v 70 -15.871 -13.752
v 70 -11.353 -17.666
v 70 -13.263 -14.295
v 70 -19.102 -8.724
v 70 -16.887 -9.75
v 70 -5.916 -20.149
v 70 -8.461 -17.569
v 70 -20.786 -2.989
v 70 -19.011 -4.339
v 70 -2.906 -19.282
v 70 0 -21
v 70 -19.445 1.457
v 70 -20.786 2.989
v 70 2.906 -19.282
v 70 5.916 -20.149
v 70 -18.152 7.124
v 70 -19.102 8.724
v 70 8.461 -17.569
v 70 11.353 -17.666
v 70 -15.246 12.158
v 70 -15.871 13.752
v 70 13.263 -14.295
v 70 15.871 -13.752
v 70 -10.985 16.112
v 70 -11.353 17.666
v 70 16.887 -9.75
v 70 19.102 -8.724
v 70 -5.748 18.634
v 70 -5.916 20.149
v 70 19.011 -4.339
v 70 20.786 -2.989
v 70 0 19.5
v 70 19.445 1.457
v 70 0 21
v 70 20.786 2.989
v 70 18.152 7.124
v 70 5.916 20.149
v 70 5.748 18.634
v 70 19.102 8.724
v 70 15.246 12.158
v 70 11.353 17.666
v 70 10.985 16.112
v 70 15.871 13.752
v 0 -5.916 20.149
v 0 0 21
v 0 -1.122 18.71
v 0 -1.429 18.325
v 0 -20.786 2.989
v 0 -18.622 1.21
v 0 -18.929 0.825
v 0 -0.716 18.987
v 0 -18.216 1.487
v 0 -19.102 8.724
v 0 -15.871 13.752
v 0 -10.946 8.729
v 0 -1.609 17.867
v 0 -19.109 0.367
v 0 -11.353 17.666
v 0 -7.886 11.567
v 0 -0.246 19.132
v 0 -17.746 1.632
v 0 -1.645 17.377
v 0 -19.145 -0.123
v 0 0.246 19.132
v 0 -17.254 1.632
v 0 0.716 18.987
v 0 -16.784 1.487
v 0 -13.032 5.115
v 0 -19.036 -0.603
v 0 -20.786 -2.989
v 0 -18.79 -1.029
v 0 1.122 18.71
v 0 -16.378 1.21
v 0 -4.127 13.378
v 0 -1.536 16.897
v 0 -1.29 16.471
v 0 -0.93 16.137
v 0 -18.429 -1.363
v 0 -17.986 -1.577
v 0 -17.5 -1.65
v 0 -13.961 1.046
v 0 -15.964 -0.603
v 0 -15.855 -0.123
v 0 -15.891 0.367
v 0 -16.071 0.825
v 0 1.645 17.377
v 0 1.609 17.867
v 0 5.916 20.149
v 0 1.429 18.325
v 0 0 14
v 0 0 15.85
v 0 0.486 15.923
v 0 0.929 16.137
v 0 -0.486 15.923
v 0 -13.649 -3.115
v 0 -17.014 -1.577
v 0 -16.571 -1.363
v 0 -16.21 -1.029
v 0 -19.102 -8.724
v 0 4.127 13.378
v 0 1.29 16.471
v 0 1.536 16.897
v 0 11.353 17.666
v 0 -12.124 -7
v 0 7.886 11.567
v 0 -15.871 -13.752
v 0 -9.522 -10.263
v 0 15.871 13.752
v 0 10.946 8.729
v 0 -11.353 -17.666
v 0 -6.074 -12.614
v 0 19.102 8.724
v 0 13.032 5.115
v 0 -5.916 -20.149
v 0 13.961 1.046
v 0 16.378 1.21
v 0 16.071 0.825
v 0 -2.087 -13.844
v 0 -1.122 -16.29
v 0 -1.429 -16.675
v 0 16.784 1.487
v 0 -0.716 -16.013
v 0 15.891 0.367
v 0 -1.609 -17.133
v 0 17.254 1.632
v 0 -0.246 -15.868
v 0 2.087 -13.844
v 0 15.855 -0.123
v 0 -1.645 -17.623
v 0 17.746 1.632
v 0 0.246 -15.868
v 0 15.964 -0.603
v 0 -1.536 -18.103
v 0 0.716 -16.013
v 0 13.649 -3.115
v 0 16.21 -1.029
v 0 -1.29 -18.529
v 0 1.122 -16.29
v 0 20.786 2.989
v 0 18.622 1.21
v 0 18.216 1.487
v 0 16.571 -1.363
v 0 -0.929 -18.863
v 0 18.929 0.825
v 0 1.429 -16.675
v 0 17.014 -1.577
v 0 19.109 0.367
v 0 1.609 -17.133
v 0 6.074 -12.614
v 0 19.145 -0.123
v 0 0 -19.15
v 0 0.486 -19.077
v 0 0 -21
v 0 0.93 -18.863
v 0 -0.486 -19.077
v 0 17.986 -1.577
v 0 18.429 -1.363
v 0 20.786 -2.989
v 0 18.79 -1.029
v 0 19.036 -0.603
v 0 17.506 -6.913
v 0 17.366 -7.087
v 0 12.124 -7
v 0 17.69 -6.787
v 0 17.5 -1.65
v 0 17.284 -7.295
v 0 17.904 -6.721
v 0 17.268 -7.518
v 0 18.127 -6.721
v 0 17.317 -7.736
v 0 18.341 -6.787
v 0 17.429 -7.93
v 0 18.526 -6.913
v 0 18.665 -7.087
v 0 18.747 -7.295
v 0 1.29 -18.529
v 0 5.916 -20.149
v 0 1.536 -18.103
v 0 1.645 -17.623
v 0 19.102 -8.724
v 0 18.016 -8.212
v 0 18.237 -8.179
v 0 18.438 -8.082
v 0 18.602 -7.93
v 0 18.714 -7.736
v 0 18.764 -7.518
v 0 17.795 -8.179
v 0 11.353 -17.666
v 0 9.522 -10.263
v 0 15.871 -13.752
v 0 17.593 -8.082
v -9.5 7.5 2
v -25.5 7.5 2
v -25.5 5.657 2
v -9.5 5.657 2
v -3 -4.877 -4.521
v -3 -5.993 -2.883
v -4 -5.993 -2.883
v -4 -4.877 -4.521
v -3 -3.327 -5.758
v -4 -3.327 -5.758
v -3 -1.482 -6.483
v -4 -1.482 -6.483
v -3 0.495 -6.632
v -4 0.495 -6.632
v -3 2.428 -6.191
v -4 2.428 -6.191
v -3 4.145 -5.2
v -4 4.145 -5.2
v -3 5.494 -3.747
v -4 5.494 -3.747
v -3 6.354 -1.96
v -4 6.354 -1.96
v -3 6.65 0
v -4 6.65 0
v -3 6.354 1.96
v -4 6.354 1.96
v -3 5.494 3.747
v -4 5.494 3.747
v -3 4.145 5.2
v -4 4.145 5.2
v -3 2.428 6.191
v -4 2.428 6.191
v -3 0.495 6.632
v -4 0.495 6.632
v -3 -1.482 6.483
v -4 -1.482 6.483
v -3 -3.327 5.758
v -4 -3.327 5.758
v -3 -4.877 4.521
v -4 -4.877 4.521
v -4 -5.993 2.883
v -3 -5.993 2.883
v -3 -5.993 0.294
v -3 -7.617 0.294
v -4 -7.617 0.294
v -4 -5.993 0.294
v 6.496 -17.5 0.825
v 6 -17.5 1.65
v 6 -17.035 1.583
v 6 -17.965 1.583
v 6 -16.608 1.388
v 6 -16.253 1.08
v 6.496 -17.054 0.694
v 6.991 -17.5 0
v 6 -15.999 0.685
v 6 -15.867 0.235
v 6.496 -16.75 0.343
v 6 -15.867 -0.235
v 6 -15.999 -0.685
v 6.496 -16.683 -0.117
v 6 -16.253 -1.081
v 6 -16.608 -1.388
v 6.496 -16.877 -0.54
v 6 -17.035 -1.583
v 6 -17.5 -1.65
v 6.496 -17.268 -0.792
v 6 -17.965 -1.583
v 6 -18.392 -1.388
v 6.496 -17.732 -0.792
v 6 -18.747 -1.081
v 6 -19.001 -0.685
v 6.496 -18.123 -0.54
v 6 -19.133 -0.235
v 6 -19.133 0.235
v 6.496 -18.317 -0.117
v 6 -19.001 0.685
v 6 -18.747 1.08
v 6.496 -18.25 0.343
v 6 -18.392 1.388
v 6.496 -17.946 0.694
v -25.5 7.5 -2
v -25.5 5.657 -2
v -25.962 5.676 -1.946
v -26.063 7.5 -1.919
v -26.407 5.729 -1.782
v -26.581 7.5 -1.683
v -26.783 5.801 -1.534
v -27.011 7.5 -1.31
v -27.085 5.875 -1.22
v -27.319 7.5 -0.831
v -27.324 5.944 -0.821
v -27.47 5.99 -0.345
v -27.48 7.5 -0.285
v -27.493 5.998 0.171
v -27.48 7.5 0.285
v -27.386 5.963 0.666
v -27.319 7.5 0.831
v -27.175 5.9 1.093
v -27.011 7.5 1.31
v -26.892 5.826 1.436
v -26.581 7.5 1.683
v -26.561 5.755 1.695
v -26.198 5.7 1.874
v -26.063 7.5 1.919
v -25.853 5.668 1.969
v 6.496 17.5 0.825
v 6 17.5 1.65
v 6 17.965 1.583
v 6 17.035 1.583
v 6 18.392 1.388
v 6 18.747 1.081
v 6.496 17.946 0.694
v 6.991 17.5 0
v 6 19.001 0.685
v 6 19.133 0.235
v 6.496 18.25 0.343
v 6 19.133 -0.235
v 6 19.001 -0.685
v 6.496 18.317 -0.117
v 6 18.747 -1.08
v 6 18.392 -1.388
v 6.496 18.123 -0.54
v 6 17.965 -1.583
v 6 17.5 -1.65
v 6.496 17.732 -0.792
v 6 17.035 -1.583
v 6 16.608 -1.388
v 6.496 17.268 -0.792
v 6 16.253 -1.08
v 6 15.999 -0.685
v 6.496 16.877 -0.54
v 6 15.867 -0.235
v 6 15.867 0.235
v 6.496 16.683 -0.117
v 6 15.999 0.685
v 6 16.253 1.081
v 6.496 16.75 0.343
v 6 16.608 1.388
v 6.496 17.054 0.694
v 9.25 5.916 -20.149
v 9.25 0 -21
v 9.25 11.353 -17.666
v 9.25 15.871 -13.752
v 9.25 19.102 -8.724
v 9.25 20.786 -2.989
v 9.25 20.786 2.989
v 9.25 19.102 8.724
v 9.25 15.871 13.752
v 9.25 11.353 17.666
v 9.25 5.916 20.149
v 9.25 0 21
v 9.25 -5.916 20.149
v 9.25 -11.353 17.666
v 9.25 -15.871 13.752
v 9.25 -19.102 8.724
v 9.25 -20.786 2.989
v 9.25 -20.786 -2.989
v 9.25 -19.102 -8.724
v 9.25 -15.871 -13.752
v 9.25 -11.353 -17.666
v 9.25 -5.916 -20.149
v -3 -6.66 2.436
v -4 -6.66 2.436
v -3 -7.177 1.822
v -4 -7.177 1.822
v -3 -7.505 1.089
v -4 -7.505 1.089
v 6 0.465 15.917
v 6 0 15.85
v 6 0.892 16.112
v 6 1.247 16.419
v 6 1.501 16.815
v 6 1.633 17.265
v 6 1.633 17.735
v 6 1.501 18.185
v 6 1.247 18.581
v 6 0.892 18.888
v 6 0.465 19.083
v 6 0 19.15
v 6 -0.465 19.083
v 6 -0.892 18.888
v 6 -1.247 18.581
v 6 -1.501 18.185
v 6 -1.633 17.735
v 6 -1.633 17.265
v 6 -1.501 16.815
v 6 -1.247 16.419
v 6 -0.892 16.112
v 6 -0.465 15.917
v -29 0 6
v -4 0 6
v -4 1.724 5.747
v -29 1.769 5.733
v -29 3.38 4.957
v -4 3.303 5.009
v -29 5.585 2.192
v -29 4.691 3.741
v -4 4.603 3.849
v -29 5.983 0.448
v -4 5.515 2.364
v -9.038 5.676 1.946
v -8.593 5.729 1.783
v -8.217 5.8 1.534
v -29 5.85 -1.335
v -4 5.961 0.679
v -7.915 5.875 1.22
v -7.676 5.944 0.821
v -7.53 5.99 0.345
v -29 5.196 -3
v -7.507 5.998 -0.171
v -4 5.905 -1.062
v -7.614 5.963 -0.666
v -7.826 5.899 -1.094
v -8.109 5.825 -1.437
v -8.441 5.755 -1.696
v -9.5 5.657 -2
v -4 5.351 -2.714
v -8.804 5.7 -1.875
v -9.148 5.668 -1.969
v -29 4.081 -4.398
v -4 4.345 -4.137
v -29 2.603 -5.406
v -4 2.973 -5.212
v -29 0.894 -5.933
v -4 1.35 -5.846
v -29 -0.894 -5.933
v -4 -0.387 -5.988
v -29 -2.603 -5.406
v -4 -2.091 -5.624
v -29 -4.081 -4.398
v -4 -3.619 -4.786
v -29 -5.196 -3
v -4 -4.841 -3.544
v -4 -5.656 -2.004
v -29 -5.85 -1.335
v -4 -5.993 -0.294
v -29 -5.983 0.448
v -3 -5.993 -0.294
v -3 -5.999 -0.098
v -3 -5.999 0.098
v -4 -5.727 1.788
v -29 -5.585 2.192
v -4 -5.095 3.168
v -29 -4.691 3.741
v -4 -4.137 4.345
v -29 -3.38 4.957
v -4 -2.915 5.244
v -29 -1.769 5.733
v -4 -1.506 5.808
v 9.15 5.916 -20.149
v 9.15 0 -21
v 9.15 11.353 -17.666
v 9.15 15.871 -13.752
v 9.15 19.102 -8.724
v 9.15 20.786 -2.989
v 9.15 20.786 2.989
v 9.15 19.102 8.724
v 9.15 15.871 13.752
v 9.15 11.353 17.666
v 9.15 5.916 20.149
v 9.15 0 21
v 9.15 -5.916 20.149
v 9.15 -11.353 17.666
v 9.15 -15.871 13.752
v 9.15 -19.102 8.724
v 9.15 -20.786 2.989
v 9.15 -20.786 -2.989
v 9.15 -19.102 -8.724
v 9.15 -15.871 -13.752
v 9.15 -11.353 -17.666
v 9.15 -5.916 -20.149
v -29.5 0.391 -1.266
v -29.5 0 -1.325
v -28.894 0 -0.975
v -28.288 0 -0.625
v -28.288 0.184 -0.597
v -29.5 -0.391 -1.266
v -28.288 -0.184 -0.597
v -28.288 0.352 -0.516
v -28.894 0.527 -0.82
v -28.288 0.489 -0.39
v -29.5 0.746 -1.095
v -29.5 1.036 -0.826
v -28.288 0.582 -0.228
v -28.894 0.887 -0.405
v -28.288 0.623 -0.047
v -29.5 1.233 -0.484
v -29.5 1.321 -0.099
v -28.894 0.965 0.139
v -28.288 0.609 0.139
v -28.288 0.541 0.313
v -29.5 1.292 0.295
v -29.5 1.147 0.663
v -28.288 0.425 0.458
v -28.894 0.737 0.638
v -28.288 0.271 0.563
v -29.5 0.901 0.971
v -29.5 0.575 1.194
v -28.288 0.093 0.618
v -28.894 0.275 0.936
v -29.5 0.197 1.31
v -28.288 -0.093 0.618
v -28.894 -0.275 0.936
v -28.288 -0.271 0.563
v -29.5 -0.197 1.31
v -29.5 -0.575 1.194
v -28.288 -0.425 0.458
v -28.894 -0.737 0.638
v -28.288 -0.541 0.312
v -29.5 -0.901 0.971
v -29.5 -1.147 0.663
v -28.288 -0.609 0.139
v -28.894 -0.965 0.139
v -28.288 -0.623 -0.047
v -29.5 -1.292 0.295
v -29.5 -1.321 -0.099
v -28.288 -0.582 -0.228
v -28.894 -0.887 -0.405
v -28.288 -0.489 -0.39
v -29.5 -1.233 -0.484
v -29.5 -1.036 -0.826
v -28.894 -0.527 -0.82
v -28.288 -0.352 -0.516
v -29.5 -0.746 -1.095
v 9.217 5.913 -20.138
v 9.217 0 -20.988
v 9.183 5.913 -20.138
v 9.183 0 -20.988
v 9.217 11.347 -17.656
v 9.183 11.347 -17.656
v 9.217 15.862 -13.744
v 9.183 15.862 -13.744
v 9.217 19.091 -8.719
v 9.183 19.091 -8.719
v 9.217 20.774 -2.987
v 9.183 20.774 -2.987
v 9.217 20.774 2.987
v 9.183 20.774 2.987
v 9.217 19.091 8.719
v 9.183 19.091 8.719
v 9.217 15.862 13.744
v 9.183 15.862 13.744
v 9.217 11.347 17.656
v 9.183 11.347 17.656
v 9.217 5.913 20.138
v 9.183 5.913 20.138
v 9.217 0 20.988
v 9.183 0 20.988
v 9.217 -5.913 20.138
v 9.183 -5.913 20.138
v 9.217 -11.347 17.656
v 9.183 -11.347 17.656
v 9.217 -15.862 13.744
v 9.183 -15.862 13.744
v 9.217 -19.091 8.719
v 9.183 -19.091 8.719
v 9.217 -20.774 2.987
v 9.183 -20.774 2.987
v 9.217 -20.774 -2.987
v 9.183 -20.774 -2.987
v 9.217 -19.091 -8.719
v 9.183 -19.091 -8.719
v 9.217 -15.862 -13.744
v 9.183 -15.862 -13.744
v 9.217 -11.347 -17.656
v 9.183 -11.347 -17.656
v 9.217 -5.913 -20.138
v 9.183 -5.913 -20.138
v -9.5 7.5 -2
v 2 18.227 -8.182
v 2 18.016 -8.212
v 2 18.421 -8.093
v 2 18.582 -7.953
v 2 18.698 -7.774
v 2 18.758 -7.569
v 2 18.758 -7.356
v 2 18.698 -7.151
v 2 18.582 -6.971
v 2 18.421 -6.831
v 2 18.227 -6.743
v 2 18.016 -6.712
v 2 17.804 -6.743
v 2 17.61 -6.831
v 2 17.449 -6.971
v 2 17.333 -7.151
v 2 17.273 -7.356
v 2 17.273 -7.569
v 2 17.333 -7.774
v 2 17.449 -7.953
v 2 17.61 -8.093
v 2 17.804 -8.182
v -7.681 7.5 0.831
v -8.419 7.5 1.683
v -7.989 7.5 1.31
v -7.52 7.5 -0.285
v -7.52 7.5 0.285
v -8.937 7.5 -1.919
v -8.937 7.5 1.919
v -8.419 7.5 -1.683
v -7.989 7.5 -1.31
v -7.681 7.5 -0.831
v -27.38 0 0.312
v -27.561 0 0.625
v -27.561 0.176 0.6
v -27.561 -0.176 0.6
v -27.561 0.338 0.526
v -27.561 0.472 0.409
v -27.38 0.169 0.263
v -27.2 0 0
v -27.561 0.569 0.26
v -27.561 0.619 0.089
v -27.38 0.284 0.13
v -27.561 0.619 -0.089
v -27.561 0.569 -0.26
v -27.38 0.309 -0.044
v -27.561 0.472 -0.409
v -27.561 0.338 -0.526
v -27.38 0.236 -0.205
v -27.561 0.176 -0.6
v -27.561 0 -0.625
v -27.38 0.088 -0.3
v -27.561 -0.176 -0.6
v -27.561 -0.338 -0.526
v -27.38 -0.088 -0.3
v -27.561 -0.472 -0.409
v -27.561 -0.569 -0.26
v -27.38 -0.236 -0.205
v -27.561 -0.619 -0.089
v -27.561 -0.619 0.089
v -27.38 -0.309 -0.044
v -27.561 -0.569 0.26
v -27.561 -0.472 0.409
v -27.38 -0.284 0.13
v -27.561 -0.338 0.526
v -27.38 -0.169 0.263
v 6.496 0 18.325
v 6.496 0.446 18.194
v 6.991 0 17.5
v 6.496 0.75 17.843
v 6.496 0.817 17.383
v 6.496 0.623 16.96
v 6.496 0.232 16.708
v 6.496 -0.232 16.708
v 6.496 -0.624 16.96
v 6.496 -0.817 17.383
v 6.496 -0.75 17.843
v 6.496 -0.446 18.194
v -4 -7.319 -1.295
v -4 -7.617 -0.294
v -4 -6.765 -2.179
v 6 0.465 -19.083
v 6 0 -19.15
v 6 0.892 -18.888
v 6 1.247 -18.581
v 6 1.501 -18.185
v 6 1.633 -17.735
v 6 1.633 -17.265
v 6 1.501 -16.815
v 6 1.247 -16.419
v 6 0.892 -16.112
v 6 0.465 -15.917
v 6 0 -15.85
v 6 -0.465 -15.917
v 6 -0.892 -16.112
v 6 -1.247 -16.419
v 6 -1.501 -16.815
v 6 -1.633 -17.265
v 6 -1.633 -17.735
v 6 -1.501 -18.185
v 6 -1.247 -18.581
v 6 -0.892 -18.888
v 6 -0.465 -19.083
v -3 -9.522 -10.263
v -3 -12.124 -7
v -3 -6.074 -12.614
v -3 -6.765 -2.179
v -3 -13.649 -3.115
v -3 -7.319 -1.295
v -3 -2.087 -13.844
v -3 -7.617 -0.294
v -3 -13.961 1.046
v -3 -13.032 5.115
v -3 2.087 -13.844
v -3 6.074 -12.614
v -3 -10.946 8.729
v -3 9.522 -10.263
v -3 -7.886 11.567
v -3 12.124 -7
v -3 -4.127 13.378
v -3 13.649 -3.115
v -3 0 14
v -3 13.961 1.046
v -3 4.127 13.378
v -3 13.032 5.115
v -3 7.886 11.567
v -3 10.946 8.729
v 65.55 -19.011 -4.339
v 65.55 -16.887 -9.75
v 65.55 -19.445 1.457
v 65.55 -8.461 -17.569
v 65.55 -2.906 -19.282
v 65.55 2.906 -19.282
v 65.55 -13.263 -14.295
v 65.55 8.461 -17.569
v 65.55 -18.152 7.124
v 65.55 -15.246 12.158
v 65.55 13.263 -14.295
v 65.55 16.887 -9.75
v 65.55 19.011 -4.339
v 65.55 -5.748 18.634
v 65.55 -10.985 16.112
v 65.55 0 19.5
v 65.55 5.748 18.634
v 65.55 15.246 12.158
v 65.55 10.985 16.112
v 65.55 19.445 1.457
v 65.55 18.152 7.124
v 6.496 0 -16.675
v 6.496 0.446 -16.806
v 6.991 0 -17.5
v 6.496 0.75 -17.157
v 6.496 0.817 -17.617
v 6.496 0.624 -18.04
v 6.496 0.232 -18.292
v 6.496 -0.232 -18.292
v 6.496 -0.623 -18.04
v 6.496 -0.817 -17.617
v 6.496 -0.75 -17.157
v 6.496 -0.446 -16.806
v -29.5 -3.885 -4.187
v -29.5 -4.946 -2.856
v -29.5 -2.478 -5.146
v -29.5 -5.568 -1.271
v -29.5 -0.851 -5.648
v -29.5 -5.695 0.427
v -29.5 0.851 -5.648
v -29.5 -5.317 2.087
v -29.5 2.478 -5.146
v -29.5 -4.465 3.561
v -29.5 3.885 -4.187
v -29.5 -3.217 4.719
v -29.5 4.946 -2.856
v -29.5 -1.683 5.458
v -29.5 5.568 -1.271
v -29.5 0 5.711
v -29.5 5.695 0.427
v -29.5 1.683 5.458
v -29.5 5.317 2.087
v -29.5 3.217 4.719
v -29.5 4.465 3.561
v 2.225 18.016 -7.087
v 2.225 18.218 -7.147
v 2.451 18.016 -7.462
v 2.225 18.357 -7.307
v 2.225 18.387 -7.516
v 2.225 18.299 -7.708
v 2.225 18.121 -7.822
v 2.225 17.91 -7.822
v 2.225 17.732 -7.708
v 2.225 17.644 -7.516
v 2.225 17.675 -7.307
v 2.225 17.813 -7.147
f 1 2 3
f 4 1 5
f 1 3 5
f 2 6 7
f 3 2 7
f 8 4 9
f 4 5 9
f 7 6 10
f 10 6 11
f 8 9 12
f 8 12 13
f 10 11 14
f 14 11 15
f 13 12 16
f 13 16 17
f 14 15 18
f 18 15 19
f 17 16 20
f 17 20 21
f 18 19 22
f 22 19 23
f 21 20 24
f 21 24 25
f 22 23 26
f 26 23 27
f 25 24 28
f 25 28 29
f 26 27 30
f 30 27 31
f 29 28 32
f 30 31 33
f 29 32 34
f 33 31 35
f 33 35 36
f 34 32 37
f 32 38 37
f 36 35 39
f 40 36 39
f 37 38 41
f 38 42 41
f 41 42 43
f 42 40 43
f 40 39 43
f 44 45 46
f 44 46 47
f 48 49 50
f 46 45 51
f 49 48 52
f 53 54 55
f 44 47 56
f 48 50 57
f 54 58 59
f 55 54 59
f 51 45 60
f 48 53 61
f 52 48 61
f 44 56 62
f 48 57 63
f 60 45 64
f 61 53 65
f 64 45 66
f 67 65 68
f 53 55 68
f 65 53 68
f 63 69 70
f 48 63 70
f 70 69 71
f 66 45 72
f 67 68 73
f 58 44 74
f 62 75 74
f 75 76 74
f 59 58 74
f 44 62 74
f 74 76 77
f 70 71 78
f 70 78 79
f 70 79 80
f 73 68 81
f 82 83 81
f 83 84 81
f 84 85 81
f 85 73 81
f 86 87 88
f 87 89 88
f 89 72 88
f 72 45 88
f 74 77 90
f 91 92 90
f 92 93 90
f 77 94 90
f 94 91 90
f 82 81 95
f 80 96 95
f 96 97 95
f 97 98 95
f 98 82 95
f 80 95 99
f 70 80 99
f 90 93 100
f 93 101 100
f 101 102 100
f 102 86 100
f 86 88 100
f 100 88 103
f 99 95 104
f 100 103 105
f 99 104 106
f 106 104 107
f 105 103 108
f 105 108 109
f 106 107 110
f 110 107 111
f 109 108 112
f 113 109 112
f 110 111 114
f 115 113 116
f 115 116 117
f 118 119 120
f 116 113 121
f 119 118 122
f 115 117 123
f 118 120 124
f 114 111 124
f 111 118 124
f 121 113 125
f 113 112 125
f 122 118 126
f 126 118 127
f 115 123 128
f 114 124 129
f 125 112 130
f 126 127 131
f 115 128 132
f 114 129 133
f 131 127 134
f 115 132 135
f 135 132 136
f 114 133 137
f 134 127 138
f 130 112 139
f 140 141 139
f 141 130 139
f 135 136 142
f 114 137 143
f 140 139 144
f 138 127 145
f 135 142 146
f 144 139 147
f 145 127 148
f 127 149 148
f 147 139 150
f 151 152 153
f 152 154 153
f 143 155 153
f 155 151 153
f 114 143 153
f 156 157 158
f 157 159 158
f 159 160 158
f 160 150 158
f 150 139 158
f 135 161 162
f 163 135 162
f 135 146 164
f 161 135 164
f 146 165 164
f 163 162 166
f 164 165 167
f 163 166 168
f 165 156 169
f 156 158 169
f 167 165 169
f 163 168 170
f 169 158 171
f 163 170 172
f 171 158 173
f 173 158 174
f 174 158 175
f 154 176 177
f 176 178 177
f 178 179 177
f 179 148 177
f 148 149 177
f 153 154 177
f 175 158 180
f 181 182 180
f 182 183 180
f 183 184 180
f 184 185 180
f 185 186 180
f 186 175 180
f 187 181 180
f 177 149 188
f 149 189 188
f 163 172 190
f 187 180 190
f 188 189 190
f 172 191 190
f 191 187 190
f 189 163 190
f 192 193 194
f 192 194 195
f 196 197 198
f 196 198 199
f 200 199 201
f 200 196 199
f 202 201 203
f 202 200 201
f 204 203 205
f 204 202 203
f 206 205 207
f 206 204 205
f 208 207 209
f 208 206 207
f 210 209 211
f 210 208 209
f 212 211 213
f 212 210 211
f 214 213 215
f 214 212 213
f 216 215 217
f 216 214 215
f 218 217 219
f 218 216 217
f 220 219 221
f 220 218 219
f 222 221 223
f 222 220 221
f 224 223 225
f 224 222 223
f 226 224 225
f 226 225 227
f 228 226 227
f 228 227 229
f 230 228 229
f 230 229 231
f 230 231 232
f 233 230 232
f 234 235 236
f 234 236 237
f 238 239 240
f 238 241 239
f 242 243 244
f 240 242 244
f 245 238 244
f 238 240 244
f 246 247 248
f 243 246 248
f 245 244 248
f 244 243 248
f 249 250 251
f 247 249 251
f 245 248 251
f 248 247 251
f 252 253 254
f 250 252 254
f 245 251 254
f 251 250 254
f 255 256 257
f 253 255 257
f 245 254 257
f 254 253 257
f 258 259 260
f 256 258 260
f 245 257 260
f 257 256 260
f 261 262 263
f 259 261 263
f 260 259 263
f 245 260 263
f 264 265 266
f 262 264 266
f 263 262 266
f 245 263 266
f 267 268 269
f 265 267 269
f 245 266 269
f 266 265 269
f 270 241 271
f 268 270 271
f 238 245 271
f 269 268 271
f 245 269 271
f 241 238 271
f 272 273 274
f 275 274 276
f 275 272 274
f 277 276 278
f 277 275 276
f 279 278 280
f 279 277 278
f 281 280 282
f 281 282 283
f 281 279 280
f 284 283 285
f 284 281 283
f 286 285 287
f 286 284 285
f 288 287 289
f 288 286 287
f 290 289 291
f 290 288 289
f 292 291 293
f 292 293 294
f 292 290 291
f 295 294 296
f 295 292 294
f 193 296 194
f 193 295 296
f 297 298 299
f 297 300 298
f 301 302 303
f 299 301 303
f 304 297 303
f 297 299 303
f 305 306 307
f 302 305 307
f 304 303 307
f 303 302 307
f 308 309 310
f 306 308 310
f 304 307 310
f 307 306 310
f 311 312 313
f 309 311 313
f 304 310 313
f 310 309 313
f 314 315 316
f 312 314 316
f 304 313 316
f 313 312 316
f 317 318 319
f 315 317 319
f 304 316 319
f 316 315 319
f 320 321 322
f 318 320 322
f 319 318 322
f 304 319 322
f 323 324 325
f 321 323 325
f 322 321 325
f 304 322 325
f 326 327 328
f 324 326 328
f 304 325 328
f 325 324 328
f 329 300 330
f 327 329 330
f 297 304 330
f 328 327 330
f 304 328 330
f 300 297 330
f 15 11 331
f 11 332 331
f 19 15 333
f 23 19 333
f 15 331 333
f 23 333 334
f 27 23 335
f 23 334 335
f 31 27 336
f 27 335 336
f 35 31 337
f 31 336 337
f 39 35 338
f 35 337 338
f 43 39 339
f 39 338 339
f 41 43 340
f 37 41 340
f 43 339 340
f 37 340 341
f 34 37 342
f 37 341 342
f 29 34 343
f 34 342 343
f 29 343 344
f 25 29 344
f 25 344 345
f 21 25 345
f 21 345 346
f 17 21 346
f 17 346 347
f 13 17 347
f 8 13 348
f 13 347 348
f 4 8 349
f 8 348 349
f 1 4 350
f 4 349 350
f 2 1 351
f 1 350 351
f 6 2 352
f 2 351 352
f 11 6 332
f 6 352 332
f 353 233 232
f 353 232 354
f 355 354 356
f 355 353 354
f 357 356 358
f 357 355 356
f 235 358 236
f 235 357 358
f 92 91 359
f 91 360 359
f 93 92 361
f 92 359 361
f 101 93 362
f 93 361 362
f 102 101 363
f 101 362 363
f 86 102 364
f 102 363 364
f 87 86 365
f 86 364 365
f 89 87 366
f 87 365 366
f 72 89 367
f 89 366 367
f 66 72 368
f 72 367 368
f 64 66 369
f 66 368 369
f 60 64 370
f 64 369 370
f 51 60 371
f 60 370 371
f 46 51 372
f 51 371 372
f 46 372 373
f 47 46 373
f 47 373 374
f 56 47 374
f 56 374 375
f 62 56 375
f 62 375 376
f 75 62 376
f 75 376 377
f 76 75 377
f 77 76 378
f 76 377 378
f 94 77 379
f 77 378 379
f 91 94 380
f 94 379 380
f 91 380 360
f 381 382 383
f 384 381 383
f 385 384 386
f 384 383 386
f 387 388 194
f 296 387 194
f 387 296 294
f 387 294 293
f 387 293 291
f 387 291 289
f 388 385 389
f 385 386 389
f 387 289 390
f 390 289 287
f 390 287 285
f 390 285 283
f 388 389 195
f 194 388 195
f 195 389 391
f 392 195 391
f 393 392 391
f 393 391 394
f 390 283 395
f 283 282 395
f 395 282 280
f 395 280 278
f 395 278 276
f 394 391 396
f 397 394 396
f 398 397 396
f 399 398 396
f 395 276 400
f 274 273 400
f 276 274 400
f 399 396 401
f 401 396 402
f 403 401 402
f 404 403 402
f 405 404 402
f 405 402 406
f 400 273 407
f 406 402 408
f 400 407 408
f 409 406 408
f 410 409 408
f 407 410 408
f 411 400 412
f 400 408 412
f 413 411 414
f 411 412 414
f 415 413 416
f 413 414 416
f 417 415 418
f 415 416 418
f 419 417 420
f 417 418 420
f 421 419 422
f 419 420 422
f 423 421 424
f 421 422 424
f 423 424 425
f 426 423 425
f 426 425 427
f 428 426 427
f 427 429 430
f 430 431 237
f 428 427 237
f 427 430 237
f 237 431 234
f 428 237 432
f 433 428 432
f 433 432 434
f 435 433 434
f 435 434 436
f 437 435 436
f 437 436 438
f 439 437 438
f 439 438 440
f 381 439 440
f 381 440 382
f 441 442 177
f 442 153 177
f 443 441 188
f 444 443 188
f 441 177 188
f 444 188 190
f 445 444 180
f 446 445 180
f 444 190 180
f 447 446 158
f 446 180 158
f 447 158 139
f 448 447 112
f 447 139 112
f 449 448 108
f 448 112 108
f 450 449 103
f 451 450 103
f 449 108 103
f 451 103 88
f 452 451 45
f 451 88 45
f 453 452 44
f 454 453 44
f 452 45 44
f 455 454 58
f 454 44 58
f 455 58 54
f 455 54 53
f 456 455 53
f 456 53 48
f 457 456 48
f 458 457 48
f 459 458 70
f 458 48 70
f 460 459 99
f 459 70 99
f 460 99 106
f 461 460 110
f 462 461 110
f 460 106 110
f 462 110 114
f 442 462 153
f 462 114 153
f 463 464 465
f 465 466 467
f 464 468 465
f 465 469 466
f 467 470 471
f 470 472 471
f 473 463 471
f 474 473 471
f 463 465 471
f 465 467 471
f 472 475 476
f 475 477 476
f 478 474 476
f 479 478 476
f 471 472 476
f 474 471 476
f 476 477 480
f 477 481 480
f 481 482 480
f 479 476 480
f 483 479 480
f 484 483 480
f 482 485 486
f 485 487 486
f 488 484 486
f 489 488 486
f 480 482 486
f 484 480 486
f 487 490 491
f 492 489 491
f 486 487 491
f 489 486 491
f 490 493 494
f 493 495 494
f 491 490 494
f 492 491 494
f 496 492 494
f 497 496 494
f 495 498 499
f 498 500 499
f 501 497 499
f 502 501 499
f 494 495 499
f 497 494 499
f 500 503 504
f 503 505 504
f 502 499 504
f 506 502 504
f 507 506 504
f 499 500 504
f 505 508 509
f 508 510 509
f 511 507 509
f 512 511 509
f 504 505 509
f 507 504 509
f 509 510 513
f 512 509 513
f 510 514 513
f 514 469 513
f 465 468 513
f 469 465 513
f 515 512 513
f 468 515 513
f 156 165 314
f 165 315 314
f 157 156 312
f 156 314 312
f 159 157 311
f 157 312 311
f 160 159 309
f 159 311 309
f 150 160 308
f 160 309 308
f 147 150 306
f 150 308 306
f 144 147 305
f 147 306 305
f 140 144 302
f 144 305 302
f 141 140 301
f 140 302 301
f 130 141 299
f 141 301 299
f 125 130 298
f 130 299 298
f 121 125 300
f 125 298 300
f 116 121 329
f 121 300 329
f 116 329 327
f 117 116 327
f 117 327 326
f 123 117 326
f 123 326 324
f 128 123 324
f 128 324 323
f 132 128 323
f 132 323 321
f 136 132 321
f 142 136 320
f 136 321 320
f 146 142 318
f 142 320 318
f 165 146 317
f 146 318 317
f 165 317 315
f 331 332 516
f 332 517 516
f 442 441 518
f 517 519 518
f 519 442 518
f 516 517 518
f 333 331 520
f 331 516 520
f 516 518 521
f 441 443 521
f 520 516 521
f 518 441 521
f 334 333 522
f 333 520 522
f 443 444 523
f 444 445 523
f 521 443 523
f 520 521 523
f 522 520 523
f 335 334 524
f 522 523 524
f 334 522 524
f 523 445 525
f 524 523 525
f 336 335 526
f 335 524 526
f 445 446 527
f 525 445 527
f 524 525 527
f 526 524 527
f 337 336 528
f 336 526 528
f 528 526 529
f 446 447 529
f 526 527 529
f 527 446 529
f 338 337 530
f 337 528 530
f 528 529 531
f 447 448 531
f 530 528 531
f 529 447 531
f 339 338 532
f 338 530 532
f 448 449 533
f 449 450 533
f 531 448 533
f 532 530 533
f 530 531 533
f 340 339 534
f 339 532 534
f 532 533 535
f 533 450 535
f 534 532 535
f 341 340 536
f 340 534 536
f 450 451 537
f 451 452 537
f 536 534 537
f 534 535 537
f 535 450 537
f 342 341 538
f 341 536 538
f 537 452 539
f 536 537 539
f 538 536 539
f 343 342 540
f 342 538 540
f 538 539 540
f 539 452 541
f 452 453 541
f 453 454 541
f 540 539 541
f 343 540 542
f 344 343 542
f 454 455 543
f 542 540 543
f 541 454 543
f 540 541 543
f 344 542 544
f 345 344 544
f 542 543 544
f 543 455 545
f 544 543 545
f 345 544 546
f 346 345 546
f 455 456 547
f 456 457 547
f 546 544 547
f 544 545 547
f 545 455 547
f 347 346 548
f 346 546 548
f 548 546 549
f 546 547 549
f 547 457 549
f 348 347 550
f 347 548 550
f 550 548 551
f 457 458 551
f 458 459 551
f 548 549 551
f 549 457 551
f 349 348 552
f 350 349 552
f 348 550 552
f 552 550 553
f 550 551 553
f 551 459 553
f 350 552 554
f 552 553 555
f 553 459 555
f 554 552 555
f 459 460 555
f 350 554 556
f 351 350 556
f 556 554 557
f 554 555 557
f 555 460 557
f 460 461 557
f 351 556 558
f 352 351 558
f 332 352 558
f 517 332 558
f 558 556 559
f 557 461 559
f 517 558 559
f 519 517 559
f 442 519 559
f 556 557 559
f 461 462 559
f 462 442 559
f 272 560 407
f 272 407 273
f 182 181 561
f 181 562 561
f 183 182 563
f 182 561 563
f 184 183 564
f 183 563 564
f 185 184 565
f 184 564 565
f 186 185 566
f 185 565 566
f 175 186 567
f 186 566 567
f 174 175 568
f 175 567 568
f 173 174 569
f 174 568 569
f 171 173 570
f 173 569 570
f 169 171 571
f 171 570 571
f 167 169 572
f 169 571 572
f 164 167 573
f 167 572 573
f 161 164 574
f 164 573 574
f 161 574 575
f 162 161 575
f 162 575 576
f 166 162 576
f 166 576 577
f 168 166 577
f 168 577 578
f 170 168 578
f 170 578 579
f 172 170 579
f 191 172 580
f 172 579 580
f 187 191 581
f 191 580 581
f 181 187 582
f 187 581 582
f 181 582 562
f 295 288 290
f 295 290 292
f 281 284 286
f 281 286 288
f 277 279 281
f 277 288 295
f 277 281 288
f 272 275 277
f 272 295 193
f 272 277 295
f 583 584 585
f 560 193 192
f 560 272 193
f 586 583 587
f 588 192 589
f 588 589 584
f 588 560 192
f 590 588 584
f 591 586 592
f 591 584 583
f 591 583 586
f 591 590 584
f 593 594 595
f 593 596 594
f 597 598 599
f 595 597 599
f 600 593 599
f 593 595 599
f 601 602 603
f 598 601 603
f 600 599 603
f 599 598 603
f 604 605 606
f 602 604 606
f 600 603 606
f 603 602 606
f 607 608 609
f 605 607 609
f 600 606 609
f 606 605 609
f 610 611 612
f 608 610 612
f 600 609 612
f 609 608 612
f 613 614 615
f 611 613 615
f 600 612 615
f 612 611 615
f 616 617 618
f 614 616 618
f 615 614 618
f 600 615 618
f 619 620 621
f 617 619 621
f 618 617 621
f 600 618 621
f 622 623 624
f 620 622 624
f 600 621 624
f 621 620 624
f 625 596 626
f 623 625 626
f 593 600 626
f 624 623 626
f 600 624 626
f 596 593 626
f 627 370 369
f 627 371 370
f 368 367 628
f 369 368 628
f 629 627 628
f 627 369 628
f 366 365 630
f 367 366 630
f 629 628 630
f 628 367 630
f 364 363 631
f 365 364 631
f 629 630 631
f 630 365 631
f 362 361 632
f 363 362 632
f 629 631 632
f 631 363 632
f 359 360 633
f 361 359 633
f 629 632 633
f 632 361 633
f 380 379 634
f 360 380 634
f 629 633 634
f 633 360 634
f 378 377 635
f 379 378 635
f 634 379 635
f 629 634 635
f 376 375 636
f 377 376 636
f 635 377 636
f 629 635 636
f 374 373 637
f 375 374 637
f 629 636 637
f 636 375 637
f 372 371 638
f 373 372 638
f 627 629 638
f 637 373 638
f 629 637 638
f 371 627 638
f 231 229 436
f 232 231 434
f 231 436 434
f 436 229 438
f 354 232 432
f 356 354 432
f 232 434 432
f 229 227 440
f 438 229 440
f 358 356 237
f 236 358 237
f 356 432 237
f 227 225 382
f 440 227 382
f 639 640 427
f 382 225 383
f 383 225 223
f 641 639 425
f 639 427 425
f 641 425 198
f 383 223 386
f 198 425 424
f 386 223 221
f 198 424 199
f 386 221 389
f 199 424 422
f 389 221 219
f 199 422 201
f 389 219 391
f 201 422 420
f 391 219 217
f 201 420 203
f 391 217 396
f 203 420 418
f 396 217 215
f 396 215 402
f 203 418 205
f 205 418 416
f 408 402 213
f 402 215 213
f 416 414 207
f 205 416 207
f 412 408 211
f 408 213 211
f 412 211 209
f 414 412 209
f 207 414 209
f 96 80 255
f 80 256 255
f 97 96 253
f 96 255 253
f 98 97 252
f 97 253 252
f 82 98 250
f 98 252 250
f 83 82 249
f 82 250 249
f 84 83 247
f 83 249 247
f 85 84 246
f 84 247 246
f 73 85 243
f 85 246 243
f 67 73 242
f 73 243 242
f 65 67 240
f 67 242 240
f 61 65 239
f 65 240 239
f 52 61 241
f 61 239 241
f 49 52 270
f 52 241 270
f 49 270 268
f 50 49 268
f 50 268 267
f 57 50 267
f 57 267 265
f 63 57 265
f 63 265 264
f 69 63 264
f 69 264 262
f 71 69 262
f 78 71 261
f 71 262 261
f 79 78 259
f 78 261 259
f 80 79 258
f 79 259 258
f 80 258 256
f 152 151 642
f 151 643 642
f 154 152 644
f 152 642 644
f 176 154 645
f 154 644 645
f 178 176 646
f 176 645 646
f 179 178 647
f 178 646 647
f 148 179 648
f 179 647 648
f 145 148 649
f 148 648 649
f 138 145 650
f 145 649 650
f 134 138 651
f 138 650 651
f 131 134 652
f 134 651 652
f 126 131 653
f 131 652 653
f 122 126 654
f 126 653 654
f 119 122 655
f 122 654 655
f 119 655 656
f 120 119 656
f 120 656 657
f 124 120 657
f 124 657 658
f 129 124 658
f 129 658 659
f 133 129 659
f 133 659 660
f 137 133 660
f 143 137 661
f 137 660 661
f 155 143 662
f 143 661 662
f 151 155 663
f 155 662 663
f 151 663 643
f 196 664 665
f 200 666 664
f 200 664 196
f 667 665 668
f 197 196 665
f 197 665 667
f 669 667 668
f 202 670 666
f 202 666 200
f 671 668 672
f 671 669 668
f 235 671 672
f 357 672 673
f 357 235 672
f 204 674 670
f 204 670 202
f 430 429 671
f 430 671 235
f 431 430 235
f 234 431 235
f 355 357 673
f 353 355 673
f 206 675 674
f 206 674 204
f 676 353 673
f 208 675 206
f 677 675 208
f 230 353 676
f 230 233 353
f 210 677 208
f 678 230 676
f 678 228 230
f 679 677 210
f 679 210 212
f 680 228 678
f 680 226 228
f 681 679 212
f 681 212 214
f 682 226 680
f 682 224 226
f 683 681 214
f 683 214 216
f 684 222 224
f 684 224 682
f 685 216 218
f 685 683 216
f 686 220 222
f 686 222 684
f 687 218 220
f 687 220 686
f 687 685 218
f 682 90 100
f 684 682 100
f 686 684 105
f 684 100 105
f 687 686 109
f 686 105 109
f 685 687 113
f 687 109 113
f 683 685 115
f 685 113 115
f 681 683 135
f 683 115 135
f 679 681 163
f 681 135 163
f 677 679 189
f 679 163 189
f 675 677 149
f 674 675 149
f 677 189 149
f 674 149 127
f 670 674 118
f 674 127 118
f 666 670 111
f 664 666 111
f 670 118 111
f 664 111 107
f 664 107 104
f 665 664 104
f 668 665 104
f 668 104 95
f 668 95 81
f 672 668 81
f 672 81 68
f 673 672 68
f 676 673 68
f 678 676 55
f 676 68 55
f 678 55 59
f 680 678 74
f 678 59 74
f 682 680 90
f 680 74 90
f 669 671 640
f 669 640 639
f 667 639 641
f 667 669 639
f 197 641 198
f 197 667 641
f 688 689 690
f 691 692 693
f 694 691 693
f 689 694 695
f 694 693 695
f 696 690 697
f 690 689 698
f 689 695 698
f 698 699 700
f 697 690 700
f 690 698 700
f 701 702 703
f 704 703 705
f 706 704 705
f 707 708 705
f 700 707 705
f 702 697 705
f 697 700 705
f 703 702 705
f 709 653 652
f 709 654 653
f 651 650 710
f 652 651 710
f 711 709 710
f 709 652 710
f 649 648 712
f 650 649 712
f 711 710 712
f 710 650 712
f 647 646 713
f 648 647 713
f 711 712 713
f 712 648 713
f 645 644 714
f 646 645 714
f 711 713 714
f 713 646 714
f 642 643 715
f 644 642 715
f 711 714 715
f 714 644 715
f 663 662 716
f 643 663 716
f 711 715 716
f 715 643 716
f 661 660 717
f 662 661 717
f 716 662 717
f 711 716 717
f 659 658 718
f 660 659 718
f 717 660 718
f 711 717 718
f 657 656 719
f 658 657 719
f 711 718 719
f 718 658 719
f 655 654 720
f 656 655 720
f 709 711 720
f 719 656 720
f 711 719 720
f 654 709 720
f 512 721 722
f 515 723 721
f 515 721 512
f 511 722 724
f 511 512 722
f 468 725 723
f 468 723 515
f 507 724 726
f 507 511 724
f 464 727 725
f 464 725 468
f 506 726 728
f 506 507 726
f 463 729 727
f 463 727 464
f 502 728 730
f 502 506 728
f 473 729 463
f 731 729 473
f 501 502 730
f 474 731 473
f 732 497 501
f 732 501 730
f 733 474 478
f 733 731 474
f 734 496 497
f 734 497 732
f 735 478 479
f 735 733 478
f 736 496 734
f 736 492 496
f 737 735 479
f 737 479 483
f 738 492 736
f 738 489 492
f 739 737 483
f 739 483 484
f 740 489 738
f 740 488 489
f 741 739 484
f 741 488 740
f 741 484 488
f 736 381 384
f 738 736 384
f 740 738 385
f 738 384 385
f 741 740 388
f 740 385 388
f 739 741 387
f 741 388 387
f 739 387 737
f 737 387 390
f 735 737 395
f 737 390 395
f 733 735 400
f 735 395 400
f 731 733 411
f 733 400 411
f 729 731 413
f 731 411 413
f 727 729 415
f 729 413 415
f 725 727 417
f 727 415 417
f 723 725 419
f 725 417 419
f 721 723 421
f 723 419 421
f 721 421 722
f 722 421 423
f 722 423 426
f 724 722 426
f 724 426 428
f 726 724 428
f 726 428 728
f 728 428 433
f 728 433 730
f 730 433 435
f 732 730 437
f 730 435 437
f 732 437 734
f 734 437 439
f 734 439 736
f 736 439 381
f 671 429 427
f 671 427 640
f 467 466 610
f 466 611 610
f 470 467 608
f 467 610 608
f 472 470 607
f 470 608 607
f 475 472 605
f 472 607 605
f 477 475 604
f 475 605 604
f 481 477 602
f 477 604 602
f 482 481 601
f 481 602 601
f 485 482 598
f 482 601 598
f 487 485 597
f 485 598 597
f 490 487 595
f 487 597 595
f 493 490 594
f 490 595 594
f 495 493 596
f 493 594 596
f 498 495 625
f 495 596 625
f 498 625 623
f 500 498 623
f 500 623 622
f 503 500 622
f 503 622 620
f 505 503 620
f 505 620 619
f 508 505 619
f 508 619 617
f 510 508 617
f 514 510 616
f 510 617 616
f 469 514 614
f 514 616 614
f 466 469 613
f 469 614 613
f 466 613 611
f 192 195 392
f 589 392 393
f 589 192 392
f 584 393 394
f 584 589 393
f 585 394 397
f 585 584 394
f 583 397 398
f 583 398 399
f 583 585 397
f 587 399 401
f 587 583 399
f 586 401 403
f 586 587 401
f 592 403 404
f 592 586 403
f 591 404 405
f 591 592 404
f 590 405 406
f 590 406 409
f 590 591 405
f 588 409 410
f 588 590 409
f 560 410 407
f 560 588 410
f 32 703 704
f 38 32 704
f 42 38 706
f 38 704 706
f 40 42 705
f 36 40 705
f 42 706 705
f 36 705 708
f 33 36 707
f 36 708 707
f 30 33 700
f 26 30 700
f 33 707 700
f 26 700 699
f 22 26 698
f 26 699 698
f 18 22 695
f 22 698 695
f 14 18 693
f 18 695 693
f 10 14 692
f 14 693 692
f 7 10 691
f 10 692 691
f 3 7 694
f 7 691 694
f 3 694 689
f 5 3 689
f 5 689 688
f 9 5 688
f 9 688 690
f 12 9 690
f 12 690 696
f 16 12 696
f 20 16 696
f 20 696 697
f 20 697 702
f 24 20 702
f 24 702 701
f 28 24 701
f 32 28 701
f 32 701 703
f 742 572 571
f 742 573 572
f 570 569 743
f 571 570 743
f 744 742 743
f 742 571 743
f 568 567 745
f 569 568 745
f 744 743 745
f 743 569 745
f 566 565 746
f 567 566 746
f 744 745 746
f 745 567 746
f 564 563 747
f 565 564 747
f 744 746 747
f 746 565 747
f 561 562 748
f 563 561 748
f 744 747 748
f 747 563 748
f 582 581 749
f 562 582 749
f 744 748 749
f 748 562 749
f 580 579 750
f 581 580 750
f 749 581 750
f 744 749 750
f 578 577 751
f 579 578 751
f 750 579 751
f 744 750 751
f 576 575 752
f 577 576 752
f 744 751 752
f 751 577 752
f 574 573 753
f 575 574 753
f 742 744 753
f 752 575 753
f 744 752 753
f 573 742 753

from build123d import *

# Parameters (mm, degrees)
SKETCH2_R                              = 14
BOSS_EXTRUDE1_DEPTH                    = 3
SKETCH3_R                              = 6
BOSS_EXTRUDE2_DEPTH                    = 26.5
BOSS_EXTRUDE3_DEPTH                    = 1
BOSS_EXTRUDE4_REACH                    = 80.443
BOSS_EXTRUDE4_END_RADIUS               = 6
M36_CLEARANCE_HOLE1_D                  = 39
M36_CLEARANCE_HOLE1_DEPTH              = 4.45
F_1_5_1_5_DIAMETER_HOLE1_D             = 1.5
F_1_5_1_5_DIAMETER_HOLE1_DEPTH         = 2
F_1_5_1_5_DIAMETER_HOLE1_TIP           = 0.450645464
F_3_3_3_3_DIAMETER_HOLE1_D             = 3.3
F_3_3_3_3_DIAMETER_HOLE1_DEPTH         = 6
F_3_3_3_3_DIAMETER_HOLE1_TIP           = 0.991420021
F_1_25_1_25_DIAMETER_HOLE1_D           = 1.25
F_1_25_1_25_DIAMETER_HOLE1_DEPTH       = 1.939156082
F_1_25_1_25_DIAMETER_HOLE1_CSINK_D     = 2.65
F_1_25_1_25_DIAMETER_HOLE1_CSINK_ANGLE = 60
F_1_25_1_25_DIAMETER_HOLE1_TIP         = 0.360843918
CHAMFER1_SIZE                          = 0.288675135
CHAMFER1_SIZE2                         = 0.5


with BuildPart() as part:
    # Sketch1 → Revolve1 (revolve)
    with BuildSketch(Plane.XY, mode=Mode.PRIVATE) as revolve1_sk:
        with BuildLine():
            Line((0, 21), (0, 0))
            Line((0, 0), (70, 0))
            Line((70, 0), (70, 21))
            Line((70, 21), (9.25, 21))
            ThreePointArc((9.25, 21), (9.2, 20.98660254), (9.15, 21))
            Line((9.15, 21), (0, 21))
        make_face()
    revolve(revolve1_sk.sketch.rotate(Axis((0, 0, 0), (1, 0, 0)), 270), axis=Axis((0, 0, 0), (1, 0, 0)))

    # Sketch2 → Boss-Extrude1 (add)
    with BuildSketch(Plane.ZY):
        Circle(SKETCH2_R)
    extrude(amount=BOSS_EXTRUDE1_DEPTH)

    # Sketch3 → Boss-Extrude2 (add)
    with BuildSketch(Plane.ZY.offset(3)):
        Circle(SKETCH3_R)
    extrude(amount=BOSS_EXTRUDE2_DEPTH)

    # Sketch4 → Boss-Extrude3 (add)
    with BuildSketch(Plane.ZY.offset(3)):
        with BuildLine():
            Line((0.293916284, -7.616838781), (0.293916284, -5.992796778))
            ThreePointArc((0.293916284, -5.992796778), (0, 6), (-0.293916284, -5.992796778))
            Line((-0.293916284, -5.992796778), (-0.293916284, -7.616838781))
            ThreePointArc((-0.293916284, -7.616838781), (-1.755912185, -7.072113956), (-2.882513969, -5.992796778))
            ThreePointArc((-2.882513969, -5.992796778), (0, 6.65), (2.882513969, -5.992796778))
            ThreePointArc((2.882513969, -5.992796778), (1.821852016, -7.17721696), (0.293916284, -7.616838781))
        make_face()
    extrude(amount=BOSS_EXTRUDE3_DEPTH)

    # Boss-Extrude4: up to this cylinder (the profile starts outside it)
    boss_extrude4_end = Plane(origin=(-17.5, 0, 0), z_dir=(1, 0, 0)) * Cylinder(BOSS_EXTRUDE4_END_RADIUS, 173.886, mode=Mode.PRIVATE)
    # Sketch5 → Boss-Extrude4 (add, up to the surface)
    with BuildSketch(Plane(origin=(0, 7.5, 0), x_dir=(1, 0, 0), z_dir=(0, 1, 0)), mode=Mode.PRIVATE) as boss_extrude4_sk1:
        with BuildLine():
            Line((-9.5, 2), (-25.5, 2))
            ThreePointArc((-25.5, 2), (-27.5, 0), (-25.5, -2))
            Line((-25.5, -2), (-9.5, -2))
            ThreePointArc((-9.5, -2), (-7.5, 0), (-9.5, 2))
        make_face()
    boss_extrude4_tool1 = extrude(boss_extrude4_sk1.sketch, amount=-BOSS_EXTRUDE4_REACH, mode=Mode.PRIVATE) - boss_extrude4_end
    add(boss_extrude4_tool1.solids().sort_by_distance((-17.5, 7.5, 0))[0])

    # M36 Clearance Hole1
    with Locations(Plane(origin=(70, 0, 0), x_dir=(0, 0, -1), z_dir=(1, 0, 0))):
        with Locations((0, 0)):
            Hole(M36_CLEARANCE_HOLE1_D / 2, depth=M36_CLEARANCE_HOLE1_DEPTH)

    # Ø1.5 (1.5) Diameter Hole1
    with Locations(Plane.ZY):
        with Locations((-7.462326931, 18.015650884)):
            Hole(F_1_5_1_5_DIAMETER_HOLE1_D / 2, depth=F_1_5_1_5_DIAMETER_HOLE1_DEPTH)
            with Locations((0, 0, -(F_1_5_1_5_DIAMETER_HOLE1_DEPTH + F_1_5_1_5_DIAMETER_HOLE1_TIP / 2))):  # 118° drill point
                Cone(0, F_1_5_1_5_DIAMETER_HOLE1_D / 2, F_1_5_1_5_DIAMETER_HOLE1_TIP, mode=Mode.SUBTRACT)

    # Ø3.3 (3.3) Diameter Hole1
    with Locations(Plane.ZY):
        with Locations((3.0543e-05, 17.5), (17.5, -3.0543e-05), (-3.0543e-05, -17.5), (-17.5, 3.0543e-05)):
            Hole(F_3_3_3_3_DIAMETER_HOLE1_D / 2, depth=F_3_3_3_3_DIAMETER_HOLE1_DEPTH)
            with Locations((0, 0, -(F_3_3_3_3_DIAMETER_HOLE1_DEPTH + F_3_3_3_3_DIAMETER_HOLE1_TIP / 2))):  # 118° drill point
                Cone(0, F_3_3_3_3_DIAMETER_HOLE1_D / 2, F_3_3_3_3_DIAMETER_HOLE1_TIP, mode=Mode.SUBTRACT)

    # Ø1.25 (1.25) Diameter Hole1
    with Locations(Plane.ZY.offset(29.5)):
        with Locations((0, 0)):
            CounterSinkHole(F_1_25_1_25_DIAMETER_HOLE1_D / 2, F_1_25_1_25_DIAMETER_HOLE1_CSINK_D / 2, depth=F_1_25_1_25_DIAMETER_HOLE1_DEPTH, counter_sink_angle=F_1_25_1_25_DIAMETER_HOLE1_CSINK_ANGLE)
            with Locations((0, 0, -(F_1_25_1_25_DIAMETER_HOLE1_DEPTH + F_1_25_1_25_DIAMETER_HOLE1_TIP / 2))):  # 120° drill point
                Cone(0, F_1_25_1_25_DIAMETER_HOLE1_D / 2, F_1_25_1_25_DIAMETER_HOLE1_TIP, mode=Mode.SUBTRACT)

    # Chamfer1
    chamfer1_edges = [part.edges().sort_by_distance(p)[0] for p in [
        (-29.5, 0, -6),
    ]]
    chamfer1_side = [part.faces().sort_by_distance(p)[0] for p in [
        (-29.5, 0, -5.830294373),
    ]]
    chamfer(chamfer1_edges, length=CHAMFER1_SIZE, length2=CHAMFER1_SIZE2, reference=chamfer1_side[0])


solid = part.part
